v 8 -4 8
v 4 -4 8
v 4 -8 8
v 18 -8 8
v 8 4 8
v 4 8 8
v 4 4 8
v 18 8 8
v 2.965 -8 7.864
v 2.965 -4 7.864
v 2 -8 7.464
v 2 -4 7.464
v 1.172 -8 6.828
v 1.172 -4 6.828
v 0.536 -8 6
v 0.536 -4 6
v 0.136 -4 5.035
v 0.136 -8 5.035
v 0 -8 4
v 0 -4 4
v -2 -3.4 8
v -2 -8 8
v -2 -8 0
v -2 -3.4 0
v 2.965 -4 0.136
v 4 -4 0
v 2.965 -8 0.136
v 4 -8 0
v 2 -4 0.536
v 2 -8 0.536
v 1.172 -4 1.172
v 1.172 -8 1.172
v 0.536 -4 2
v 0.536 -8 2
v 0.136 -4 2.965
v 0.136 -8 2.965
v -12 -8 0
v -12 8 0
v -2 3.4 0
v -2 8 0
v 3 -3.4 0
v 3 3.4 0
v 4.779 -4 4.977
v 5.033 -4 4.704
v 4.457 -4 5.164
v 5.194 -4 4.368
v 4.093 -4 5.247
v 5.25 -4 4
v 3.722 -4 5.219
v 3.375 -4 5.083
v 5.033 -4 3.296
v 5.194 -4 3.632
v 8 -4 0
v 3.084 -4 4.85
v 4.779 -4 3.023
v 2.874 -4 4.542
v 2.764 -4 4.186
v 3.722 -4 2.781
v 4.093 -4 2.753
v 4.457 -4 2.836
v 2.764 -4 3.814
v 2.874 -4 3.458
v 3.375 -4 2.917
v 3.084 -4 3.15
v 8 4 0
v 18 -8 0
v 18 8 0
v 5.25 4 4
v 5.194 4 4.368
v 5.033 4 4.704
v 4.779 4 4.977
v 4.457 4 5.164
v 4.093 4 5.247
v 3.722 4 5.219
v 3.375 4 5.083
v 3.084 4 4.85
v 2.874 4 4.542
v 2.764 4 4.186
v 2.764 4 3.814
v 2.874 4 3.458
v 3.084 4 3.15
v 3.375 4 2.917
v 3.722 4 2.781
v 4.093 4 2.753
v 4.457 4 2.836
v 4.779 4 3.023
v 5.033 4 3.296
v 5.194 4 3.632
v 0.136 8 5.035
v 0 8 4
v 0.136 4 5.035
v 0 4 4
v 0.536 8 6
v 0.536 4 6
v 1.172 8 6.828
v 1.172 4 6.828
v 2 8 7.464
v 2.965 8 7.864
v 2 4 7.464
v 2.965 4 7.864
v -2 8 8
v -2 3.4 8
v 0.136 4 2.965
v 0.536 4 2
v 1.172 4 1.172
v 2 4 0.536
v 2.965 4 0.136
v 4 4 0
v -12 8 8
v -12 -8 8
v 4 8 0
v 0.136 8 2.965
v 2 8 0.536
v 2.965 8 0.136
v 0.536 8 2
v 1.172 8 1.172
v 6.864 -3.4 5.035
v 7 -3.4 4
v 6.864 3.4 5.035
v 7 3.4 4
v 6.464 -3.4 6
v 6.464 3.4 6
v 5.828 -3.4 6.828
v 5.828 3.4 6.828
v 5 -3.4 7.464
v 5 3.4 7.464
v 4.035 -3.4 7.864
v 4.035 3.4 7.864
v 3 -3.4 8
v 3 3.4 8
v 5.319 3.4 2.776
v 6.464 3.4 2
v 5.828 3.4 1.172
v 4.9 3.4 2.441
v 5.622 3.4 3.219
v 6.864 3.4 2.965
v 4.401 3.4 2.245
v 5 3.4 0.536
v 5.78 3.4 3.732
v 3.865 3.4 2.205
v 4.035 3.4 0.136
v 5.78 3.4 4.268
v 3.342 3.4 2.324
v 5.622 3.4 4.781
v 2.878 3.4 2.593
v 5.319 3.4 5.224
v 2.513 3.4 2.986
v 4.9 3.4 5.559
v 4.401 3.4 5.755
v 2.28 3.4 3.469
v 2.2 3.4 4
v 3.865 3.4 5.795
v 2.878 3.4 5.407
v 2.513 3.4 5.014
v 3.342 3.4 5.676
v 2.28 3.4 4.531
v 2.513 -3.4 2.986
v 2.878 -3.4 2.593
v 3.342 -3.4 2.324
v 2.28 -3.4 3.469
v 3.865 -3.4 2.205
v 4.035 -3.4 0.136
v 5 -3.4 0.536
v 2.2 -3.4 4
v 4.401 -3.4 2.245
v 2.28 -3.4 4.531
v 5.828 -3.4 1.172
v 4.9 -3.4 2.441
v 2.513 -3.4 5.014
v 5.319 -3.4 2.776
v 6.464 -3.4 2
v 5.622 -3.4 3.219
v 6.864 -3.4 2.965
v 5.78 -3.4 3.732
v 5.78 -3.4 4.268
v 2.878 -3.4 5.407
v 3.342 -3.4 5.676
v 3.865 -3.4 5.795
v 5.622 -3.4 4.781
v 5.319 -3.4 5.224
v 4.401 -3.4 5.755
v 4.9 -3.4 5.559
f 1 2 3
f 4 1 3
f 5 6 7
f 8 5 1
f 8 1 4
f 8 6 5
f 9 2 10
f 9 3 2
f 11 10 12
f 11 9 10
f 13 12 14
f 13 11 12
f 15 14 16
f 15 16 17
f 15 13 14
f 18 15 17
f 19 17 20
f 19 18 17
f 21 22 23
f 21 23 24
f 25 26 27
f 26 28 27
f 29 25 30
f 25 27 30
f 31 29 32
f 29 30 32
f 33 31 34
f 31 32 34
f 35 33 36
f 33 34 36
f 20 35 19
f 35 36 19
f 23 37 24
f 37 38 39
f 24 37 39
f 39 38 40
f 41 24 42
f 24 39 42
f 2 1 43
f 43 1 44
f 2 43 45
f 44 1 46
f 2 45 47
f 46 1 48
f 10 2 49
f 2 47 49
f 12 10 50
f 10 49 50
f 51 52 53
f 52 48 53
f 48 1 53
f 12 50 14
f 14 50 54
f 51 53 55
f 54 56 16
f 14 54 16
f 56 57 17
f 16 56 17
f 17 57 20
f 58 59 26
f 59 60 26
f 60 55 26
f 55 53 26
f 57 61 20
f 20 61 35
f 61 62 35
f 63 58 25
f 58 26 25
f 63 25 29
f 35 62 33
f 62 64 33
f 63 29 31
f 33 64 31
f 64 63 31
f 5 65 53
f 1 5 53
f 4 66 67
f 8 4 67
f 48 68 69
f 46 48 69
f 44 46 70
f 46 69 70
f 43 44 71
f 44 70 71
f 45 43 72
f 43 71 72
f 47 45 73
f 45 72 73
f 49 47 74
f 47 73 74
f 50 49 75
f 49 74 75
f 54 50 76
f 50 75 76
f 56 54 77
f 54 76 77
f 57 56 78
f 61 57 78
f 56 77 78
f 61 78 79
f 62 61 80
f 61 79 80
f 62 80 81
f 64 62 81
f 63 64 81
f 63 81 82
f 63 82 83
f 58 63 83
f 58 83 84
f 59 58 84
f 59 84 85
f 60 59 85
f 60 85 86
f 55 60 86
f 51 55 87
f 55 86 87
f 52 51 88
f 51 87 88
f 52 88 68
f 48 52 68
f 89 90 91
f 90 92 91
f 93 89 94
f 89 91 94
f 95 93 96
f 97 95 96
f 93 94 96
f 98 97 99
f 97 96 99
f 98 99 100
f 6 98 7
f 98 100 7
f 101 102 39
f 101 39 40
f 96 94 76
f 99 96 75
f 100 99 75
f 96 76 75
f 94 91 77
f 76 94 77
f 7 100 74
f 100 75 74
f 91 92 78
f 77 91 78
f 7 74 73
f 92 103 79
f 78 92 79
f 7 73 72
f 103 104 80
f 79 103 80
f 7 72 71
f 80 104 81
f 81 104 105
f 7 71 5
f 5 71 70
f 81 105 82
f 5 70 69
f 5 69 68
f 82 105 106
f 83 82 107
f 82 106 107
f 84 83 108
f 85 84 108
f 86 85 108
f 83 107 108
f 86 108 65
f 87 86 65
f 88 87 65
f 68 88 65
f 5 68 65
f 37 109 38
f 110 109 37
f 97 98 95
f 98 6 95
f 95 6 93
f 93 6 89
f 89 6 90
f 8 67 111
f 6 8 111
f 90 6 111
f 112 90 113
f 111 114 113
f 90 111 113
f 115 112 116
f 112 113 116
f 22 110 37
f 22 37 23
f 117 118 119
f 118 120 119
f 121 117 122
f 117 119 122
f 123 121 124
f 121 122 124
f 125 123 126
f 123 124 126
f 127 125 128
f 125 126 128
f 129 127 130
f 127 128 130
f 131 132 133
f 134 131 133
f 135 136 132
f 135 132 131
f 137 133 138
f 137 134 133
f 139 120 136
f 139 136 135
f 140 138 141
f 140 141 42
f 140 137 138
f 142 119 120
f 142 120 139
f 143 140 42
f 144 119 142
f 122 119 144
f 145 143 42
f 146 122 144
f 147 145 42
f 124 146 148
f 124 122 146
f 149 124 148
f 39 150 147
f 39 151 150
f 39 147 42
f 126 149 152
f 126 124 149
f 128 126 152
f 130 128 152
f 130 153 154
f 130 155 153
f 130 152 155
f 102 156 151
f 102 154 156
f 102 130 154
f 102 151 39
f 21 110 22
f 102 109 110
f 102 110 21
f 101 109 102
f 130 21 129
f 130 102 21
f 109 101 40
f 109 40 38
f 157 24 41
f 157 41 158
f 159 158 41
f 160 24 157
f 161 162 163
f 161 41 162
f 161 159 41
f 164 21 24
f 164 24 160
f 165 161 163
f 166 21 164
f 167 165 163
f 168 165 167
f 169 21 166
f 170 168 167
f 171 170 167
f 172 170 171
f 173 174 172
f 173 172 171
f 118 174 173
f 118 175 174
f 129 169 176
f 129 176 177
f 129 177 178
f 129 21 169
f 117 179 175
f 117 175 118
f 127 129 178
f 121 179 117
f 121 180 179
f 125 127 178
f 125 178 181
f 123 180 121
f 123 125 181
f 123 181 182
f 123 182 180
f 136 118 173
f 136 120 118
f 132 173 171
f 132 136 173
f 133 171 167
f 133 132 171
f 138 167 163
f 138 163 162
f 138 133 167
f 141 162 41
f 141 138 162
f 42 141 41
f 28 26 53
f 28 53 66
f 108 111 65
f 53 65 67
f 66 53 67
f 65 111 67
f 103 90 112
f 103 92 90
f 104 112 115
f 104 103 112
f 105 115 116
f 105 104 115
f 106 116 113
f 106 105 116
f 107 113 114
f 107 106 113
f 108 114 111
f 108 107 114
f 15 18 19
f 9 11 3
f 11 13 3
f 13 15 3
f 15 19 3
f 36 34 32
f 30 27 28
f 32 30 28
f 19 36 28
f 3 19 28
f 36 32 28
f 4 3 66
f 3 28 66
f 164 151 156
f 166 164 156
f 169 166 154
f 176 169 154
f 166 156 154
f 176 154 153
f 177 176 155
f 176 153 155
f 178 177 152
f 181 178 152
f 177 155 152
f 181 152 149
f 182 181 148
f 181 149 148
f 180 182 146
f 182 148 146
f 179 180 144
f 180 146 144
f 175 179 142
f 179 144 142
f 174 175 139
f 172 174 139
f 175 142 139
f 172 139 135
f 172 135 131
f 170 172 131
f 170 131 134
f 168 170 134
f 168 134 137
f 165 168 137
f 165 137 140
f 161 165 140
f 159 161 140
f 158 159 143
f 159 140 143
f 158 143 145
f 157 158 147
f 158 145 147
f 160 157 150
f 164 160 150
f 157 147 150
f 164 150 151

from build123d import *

# Parameters (mm, degrees)
F1_DEPTH = 8
F2_R     = 1.25
F3_DEPTH = 8
F5_DEPTH = 8
F6_R     = 1.8
F7_DEPTH = 6.8
F8_R     = 3.99999
F8_2_R   = 3.99999


# Not quite as in the source:
# - a fillet or chamfer is up to 0.001 mm smaller than in the source, because OpenCascade refuses the exact size


with BuildPart() as f1:
    # F0 (on Top) → F1 (new body)
    with BuildSketch(Plane.XY):
        Polygon((0, 8), (0, 4), (8, 4), (8, -4), (0, -4), (0, -8), (18, -8), (18, 8), align=None)
    extrude(amount=F1_DEPTH)

    # F2 (on face) → F3 (join, through all)
    with BuildSketch(Plane.XZ.offset(-4)):
        with Locations((4, 4)):
            Circle(F2_R)
    extrude(amount=F3_DEPTH)

    # F8 (radius 4 in the source; OpenCascade refuses exactly that, so slightly less here)
    f8_edges = [f1.edges().sort_by_distance(p)[0] for p in [
        (0, 6, 8),
        (0, -6, 8),
        (0, -6, 0),
        (0, 6, 0),
    ]]
    fillet(f8_edges, radius=F8_R)


with BuildPart() as f5:
    # F4 (on face) → F5 (new body, through all)
    with BuildSketch(Plane.XY.offset(8)):
        Polygon((7, -3.4), (7, 3.4), (-2, 3.4), (-2, 8), (-12, 8), (-12, -8), (-2, -8), (-2, -3.4), align=None)
    extrude(amount=-F5_DEPTH)

    # F6 (on face) → F7 (cut, through all)
    with BuildSketch(Plane(origin=(0, 3.4, 0), x_dir=(-1, 0, 0), z_dir=(0, 1, 0))):
        with Locations((-4, 4)):
            Circle(F6_R)
    extrude(amount=-F7_DEPTH, mode=Mode.SUBTRACT)

    # F8#2 (radius 4 in the source; OpenCascade refuses exactly that, so slightly less here)
    f8_2_edges = [f5.edges().sort_by_distance(p)[0] for p in [
        (7, 0, 8),
        (7, 0, 0),
    ]]
    fillet(f8_2_edges, radius=F8_2_R)


solid = Compound([f1.part, f5.part])
